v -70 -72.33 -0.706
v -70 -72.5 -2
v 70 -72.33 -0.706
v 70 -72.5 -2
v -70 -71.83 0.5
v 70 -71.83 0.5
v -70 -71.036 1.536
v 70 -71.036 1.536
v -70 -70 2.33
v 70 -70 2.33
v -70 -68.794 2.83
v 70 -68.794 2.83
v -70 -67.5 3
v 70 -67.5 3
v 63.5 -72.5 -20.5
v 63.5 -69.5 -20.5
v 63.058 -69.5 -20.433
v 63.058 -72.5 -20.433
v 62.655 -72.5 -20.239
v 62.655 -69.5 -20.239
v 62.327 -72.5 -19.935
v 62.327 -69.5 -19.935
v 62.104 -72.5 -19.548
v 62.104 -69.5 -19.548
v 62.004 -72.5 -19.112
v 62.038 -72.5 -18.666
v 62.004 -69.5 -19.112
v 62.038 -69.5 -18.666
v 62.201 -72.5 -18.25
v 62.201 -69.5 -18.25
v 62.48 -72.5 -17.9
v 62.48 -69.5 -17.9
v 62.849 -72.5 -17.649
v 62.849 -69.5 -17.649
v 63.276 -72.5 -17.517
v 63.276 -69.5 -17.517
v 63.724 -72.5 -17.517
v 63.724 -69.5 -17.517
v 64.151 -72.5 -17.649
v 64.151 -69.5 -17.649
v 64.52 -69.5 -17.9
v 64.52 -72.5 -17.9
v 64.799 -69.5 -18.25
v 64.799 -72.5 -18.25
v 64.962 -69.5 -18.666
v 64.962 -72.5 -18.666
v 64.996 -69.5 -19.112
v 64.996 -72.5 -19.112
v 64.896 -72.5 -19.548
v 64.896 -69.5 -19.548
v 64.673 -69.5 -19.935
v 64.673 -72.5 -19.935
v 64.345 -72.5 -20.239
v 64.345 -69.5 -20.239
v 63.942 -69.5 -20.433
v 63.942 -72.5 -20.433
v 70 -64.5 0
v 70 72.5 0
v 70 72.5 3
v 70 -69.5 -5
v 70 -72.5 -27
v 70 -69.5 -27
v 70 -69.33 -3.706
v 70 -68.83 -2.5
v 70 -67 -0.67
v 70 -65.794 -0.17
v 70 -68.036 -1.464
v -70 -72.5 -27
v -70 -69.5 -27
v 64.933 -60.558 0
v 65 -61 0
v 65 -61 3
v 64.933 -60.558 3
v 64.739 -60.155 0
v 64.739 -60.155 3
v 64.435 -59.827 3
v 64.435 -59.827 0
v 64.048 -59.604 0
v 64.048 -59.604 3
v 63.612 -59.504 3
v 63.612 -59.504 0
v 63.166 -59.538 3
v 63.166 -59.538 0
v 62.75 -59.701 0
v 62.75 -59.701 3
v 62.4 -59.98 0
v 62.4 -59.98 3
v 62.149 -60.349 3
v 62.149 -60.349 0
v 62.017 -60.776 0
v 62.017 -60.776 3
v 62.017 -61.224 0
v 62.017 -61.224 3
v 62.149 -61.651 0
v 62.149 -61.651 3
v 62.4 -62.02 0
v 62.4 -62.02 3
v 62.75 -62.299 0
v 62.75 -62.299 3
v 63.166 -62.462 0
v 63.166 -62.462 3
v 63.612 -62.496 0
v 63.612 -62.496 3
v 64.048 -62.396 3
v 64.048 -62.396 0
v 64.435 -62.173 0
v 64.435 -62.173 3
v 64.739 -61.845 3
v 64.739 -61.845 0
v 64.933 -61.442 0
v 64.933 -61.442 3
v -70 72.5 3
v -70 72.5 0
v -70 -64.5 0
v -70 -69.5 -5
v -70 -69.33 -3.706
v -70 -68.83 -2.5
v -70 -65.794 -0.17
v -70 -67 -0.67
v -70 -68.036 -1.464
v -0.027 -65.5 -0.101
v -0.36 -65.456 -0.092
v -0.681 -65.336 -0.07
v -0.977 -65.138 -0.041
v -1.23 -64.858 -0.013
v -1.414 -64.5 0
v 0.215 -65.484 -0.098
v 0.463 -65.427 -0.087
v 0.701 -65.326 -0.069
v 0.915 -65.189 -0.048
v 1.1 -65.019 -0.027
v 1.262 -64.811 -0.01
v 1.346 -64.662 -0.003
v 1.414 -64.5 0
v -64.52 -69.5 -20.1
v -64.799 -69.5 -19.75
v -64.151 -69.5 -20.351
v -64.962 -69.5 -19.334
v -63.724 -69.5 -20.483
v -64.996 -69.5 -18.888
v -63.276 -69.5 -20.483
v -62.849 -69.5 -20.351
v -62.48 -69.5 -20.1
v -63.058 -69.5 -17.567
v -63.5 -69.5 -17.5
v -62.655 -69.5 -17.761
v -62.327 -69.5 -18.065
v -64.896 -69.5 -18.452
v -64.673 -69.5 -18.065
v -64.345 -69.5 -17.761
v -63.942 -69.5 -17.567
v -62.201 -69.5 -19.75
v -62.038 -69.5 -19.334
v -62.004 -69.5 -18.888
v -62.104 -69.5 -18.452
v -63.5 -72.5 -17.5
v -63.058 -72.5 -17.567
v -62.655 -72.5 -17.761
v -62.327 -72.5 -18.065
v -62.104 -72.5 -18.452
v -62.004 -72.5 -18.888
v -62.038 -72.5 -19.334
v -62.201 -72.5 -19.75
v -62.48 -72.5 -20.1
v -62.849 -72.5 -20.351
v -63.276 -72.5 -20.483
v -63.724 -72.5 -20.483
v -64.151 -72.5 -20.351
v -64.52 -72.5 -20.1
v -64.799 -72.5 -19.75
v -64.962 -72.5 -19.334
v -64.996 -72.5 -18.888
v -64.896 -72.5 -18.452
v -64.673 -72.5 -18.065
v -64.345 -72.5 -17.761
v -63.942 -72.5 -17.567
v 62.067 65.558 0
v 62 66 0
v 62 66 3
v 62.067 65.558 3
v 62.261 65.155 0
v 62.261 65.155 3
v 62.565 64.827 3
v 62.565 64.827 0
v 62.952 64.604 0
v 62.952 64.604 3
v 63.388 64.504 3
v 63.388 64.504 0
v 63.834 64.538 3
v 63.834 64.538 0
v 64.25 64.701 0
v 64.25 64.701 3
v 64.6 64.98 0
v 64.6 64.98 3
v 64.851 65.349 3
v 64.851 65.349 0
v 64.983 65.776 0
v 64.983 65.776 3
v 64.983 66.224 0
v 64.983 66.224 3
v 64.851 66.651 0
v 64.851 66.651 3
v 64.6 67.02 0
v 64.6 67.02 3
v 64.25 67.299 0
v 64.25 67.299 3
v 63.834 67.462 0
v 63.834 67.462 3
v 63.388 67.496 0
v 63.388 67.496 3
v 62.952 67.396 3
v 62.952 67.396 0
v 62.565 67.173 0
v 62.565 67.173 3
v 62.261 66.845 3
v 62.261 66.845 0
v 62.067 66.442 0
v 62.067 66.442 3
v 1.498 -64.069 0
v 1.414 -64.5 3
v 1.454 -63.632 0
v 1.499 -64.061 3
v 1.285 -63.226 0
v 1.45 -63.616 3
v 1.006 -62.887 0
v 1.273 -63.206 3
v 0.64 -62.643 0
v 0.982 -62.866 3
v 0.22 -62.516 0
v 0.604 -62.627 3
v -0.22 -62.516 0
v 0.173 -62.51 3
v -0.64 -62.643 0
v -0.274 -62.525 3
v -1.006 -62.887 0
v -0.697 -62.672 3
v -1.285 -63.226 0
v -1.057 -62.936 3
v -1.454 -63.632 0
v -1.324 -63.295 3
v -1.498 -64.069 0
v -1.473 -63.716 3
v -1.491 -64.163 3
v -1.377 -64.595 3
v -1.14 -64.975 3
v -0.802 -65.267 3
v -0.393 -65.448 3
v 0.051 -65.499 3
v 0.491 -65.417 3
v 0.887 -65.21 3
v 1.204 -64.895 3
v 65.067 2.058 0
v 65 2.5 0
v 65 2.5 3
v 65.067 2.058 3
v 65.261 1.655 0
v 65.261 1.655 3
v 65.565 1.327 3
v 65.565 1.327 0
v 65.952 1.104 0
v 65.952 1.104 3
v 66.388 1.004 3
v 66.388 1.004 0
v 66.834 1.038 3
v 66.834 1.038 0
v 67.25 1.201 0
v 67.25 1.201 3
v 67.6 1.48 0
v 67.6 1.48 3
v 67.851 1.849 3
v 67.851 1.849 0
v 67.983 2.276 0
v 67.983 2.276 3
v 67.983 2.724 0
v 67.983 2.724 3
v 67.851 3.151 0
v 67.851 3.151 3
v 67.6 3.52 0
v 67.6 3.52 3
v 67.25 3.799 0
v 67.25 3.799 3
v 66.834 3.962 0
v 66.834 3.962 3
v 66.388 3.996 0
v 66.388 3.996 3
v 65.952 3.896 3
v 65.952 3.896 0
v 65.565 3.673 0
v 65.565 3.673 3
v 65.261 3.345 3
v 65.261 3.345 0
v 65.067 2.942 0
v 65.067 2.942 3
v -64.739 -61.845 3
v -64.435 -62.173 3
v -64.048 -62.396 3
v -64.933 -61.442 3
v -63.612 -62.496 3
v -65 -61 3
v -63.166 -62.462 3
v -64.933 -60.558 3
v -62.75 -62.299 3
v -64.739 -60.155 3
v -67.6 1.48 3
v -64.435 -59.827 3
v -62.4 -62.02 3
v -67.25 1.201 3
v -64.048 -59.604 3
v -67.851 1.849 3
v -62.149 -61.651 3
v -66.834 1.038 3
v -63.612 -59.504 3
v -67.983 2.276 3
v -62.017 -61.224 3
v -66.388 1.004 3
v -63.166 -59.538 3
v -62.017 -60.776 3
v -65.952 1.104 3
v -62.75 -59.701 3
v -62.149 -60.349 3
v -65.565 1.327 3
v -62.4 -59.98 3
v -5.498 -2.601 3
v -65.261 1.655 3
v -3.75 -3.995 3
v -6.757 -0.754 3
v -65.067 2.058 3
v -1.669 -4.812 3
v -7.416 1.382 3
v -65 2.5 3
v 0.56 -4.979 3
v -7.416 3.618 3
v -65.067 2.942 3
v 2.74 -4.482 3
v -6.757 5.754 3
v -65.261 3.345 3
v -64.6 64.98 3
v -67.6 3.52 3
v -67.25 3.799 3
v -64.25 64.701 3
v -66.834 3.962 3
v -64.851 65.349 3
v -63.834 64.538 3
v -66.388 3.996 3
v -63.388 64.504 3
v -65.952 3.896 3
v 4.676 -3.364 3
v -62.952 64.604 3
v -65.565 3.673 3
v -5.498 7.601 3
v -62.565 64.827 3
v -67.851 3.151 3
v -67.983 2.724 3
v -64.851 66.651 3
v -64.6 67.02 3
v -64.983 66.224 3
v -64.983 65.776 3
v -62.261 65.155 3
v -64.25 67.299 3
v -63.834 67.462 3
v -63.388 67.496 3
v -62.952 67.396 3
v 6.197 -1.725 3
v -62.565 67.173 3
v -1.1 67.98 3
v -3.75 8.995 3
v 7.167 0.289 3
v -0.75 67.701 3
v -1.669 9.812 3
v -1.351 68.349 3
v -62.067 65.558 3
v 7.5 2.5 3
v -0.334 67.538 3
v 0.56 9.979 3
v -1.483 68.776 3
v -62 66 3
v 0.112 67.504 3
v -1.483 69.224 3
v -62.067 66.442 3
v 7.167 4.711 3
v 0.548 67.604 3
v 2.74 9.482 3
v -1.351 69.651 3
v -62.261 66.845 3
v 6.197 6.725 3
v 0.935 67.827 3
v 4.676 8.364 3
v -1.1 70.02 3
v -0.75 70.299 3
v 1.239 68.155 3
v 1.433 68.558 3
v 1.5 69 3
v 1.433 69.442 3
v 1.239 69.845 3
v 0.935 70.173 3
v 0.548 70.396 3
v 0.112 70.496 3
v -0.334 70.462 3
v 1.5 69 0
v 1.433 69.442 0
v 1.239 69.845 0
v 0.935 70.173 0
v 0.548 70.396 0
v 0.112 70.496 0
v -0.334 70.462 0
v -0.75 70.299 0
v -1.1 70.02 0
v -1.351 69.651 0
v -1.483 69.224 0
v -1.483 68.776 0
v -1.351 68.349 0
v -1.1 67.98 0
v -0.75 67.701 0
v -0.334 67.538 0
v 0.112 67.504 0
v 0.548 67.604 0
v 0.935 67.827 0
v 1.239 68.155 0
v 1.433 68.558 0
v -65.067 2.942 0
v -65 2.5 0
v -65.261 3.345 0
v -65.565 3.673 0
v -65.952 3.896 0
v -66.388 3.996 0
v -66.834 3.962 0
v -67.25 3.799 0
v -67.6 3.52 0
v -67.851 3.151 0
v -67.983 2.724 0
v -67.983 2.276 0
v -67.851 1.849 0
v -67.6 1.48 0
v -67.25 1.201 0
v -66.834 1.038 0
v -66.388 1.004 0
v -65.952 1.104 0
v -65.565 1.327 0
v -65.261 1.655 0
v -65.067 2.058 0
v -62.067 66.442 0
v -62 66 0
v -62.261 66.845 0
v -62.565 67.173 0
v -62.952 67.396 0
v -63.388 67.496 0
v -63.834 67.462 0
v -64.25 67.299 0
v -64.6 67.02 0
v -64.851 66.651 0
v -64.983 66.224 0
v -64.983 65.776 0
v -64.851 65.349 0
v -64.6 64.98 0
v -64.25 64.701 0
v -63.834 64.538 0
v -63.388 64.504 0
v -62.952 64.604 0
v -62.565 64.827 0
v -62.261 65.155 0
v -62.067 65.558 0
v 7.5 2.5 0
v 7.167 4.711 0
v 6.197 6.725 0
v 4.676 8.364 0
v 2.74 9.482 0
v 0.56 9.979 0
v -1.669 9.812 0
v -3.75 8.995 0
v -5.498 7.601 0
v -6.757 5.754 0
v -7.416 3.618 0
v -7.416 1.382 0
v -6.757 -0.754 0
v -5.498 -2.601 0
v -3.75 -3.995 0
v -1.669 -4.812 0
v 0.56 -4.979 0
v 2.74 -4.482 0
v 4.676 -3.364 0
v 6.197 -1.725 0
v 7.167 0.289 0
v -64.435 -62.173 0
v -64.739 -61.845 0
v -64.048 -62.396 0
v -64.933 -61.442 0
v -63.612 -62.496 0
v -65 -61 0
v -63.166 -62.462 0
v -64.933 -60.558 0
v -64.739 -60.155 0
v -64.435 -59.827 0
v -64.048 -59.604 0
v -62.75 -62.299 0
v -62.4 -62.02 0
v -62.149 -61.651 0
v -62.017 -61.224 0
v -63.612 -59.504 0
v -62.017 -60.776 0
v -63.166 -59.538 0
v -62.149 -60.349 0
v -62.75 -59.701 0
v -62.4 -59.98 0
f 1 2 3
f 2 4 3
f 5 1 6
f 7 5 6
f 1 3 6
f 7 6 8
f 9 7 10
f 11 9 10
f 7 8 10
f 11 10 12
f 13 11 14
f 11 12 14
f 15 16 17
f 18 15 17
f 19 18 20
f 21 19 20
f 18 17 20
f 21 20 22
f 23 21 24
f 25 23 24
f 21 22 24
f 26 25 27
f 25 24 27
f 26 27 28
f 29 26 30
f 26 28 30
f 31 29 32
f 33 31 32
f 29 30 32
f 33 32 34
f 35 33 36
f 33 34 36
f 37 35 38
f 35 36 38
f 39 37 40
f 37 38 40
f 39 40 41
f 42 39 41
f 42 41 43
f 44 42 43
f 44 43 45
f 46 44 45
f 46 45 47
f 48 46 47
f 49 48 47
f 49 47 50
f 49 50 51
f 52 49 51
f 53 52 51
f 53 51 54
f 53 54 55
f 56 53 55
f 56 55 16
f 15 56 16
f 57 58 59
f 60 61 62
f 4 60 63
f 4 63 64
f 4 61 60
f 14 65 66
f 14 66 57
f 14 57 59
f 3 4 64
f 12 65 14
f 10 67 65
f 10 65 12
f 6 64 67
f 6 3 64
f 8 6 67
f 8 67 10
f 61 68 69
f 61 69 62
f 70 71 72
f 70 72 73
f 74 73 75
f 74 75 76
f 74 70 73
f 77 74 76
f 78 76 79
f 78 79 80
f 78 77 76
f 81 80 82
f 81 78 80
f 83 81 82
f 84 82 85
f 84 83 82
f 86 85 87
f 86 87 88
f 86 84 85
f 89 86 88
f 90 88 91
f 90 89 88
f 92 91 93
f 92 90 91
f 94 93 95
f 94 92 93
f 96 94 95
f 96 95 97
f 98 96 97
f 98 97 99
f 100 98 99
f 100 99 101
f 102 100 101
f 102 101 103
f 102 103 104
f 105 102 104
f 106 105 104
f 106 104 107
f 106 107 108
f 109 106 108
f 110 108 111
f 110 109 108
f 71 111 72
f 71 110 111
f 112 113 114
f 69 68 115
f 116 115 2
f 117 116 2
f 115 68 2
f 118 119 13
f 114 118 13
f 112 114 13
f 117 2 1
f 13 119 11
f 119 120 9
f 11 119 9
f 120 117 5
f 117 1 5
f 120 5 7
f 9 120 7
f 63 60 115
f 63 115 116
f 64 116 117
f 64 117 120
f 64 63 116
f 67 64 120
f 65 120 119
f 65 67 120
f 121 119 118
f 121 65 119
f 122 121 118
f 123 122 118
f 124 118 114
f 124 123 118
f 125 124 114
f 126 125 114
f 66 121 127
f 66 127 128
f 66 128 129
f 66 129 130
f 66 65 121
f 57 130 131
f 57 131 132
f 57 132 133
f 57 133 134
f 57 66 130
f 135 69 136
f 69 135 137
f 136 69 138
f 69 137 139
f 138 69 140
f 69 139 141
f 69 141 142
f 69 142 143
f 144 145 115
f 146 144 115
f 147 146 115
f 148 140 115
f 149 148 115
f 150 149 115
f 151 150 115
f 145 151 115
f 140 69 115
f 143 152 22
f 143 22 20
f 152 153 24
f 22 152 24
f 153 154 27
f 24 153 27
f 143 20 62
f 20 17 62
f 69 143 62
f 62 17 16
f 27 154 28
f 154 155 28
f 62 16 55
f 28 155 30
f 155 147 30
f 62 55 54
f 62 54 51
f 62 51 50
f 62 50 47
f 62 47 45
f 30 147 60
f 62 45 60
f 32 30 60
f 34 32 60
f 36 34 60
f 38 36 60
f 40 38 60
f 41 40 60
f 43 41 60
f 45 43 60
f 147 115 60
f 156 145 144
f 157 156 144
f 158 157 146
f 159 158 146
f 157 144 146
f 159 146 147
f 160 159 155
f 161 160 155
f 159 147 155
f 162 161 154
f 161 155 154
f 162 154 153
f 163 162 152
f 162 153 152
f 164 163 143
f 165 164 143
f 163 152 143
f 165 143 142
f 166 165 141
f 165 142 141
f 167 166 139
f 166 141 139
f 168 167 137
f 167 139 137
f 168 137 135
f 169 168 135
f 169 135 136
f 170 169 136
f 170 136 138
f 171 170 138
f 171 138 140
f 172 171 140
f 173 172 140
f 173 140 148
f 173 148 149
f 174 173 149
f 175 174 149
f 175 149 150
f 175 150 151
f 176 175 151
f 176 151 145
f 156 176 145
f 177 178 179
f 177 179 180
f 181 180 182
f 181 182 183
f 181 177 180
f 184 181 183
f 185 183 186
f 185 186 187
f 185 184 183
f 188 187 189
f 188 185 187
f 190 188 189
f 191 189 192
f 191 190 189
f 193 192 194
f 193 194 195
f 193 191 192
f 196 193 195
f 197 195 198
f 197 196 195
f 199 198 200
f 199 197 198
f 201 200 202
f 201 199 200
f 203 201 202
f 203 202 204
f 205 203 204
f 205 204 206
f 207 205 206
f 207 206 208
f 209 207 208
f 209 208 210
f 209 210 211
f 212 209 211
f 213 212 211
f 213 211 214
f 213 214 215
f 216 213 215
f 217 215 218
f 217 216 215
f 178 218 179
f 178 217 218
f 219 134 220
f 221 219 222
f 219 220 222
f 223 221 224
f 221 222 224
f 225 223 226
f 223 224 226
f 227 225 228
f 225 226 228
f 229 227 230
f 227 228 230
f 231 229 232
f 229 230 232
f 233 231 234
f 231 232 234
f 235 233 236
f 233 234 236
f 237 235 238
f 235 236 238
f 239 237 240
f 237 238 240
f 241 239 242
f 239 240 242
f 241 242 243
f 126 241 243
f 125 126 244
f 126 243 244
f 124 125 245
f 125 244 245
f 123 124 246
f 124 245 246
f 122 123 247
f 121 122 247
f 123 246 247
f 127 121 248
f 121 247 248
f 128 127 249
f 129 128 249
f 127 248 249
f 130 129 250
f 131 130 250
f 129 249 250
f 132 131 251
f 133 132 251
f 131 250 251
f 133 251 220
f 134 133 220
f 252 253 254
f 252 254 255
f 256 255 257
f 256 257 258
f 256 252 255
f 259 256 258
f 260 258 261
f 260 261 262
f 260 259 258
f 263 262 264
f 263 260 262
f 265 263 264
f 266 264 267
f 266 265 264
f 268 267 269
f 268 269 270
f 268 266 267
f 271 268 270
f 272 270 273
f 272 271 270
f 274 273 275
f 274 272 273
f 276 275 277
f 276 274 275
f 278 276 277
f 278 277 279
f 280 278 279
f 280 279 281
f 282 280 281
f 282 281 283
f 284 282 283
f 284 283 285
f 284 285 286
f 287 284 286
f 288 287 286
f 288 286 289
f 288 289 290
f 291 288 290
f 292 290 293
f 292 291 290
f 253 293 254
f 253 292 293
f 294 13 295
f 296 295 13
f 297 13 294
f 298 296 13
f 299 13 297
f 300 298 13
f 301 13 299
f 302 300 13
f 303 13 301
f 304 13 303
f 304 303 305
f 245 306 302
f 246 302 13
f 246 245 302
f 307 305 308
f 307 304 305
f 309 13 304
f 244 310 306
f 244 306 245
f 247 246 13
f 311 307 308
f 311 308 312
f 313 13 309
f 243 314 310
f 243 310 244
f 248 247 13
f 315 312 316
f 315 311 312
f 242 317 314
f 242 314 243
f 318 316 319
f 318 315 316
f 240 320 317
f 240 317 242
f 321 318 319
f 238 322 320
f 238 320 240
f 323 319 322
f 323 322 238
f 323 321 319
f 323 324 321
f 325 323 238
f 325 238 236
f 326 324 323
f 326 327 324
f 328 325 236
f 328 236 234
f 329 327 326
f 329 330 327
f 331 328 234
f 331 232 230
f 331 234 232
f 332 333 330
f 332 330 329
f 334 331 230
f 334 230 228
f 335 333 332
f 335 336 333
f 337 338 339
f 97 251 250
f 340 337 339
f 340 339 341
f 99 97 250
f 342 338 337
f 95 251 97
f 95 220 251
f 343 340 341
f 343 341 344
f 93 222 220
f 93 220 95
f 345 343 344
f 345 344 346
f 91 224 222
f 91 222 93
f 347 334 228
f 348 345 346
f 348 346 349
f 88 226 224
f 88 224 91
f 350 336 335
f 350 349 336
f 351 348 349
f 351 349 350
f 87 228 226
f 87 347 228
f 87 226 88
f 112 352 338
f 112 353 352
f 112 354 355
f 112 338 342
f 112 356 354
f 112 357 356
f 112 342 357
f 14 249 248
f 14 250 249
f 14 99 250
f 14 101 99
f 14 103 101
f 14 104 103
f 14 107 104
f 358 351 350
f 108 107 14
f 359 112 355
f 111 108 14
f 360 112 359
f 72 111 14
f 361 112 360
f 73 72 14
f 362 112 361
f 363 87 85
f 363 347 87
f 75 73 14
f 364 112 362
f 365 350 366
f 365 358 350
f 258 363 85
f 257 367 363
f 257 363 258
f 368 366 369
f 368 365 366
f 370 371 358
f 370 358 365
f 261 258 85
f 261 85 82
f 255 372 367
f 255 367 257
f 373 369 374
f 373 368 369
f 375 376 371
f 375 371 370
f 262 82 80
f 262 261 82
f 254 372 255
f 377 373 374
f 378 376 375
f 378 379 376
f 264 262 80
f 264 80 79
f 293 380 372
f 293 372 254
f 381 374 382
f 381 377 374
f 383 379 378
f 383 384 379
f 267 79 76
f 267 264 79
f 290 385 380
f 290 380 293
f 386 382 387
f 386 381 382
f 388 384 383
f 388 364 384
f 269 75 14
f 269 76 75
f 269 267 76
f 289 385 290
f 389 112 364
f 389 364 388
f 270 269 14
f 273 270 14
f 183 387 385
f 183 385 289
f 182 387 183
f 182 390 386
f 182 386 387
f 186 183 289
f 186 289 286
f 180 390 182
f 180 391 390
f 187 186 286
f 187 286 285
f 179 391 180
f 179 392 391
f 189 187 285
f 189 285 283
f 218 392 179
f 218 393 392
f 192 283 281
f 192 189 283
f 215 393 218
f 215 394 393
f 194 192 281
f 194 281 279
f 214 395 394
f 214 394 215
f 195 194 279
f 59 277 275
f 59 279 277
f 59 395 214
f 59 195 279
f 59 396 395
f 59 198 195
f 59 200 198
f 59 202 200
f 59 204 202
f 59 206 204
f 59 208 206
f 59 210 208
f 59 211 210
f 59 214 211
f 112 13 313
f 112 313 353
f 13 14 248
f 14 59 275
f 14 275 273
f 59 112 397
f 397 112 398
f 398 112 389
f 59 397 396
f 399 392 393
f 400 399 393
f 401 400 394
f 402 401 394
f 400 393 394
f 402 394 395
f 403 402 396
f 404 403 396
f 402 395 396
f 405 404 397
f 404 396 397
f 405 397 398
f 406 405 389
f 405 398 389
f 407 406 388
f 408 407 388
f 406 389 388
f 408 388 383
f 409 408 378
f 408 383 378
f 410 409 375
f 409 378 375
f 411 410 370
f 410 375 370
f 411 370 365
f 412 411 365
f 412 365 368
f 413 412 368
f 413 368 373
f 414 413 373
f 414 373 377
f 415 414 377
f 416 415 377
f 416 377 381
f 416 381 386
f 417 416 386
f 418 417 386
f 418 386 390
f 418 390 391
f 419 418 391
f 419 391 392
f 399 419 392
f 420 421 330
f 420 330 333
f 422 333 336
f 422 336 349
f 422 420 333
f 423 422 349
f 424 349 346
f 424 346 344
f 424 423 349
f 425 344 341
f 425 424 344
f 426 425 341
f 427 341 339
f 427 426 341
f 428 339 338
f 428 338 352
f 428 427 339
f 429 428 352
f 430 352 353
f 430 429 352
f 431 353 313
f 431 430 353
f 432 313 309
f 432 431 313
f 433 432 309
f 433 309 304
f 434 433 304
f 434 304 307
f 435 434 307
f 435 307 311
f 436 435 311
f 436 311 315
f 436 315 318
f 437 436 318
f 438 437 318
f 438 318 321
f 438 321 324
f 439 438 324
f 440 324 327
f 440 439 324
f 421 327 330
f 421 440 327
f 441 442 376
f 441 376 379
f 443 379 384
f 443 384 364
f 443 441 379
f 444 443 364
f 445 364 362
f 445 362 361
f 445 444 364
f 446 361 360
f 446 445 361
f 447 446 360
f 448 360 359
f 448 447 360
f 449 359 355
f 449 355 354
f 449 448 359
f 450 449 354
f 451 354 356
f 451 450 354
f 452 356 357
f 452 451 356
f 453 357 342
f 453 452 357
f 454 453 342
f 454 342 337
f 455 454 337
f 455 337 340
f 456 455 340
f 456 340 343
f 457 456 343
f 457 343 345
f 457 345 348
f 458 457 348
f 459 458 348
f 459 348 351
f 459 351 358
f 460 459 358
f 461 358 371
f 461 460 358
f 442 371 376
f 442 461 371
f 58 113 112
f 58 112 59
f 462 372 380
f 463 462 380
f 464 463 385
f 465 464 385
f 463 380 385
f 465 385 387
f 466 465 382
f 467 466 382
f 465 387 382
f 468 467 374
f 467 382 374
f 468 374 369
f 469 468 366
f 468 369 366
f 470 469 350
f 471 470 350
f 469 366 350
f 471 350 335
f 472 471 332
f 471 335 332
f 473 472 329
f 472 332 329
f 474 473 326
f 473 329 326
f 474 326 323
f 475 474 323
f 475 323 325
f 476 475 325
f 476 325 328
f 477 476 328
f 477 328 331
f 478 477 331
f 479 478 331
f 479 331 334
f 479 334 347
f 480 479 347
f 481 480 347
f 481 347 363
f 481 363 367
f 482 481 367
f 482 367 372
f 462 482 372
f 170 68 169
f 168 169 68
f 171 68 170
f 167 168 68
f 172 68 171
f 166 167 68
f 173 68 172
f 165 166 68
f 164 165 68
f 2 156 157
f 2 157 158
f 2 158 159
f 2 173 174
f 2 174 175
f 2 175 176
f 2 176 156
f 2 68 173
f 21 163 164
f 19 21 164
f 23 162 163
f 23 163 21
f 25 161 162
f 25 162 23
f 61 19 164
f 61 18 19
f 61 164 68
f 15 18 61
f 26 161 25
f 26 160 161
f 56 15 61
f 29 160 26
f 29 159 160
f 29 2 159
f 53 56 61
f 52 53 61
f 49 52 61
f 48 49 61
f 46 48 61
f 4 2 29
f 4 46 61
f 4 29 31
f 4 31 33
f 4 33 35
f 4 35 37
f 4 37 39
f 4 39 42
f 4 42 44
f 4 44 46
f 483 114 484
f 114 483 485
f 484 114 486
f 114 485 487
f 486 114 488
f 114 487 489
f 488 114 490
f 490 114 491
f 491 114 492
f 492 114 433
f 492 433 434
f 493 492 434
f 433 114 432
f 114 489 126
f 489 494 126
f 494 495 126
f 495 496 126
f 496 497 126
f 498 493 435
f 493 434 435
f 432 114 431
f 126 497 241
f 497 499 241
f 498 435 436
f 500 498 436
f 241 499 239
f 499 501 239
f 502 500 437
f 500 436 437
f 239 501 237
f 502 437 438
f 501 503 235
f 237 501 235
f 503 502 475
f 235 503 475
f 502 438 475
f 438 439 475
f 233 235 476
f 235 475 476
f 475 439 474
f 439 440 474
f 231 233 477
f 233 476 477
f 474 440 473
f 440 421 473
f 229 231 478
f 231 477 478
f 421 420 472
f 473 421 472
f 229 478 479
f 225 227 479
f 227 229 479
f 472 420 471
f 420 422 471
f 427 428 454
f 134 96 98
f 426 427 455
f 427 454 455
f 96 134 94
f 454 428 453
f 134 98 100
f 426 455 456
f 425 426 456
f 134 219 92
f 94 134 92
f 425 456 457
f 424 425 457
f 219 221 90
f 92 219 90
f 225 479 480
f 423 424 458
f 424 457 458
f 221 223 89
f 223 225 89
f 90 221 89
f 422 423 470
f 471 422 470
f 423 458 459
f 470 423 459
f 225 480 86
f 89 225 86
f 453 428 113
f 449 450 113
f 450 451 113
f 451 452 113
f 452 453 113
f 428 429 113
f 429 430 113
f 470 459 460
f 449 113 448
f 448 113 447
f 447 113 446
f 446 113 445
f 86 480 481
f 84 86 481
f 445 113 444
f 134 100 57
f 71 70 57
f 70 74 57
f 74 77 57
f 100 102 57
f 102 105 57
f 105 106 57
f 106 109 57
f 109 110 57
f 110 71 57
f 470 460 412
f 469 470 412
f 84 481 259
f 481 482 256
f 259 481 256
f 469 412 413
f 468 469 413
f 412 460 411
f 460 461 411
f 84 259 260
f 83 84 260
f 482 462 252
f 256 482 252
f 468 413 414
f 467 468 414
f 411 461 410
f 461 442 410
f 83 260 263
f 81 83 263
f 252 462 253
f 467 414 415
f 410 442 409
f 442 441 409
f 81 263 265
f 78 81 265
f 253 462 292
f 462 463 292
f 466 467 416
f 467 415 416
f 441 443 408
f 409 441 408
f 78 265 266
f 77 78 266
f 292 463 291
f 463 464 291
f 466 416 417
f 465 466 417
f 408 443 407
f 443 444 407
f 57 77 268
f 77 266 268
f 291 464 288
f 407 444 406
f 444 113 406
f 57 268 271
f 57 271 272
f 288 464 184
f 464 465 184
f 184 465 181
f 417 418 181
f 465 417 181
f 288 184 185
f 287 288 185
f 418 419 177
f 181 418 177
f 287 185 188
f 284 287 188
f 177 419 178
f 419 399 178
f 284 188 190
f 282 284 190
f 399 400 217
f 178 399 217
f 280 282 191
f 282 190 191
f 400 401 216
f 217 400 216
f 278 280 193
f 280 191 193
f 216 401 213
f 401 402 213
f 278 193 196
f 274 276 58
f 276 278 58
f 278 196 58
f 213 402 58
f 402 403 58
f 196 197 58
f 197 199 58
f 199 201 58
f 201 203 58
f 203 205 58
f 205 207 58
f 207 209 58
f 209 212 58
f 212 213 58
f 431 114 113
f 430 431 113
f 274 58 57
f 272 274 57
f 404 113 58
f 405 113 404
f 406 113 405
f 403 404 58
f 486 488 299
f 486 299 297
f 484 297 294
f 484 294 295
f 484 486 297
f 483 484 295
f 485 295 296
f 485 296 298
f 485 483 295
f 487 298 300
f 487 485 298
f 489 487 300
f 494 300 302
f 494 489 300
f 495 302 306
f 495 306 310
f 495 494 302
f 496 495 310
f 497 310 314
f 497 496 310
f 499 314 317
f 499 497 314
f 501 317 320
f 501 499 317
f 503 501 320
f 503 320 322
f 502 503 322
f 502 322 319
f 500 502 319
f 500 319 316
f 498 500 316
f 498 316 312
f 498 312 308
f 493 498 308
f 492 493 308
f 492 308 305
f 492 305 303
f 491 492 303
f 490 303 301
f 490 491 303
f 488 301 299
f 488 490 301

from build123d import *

# Parameters (mm, degrees)
SKICA1_W                 = 140
SKICA1_H                 = 145
SKICA1_R                 = 1.5
P_IDAT_VYSUNUT_M1_DEPTH  = 3
SKICA2_W                 = 140
SKICA2_H                 = 30
P_IDAT_VYSUNUT_M2_DEPTH  = 3
SKICA3_R                 = 1.5
ODEBRAT_VYSUNUT_M1_DEPTH = 161.601992516
ZAOBLIT1_R               = 5
SKICA4_R                 = 7.5
SKICA4_R_2               = 1.5
ODEBRAT_VYSUNUT_M2_DEPTH = 106.148704224


with BuildPart() as part:
    # Skica1 → Přidat vysunutím1 (new body)
    with BuildSketch(Plane.XY):
        Rectangle(SKICA1_W, SKICA1_H)
        with Locations((-63.5, 66)):
            Circle(SKICA1_R, mode=Mode.SUBTRACT)
        with Locations((-66.5, 2.5)):
            Circle(SKICA1_R, mode=Mode.SUBTRACT)
        with Locations(Location((63.5, 66, 0), (0, 0, 180))):
            Circle(SKICA1_R, mode=Mode.SUBTRACT)
        with Locations(Location((66.5, 2.5, 0), (0, 0, 180))):
            Circle(SKICA1_R, mode=Mode.SUBTRACT)
        with Locations((63.5, -61)):
            Circle(SKICA1_R, mode=Mode.SUBTRACT)
        with Locations(Location((-63.5, -61, 0), (0, 0, 180))):
            Circle(SKICA1_R, mode=Mode.SUBTRACT)
    extrude(amount=P_IDAT_VYSUNUT_M1_DEPTH)

    # Skica2 → Přidat vysunutím2 (add)
    with BuildSketch(Plane.XZ.offset(72.5)):
        with Locations((0, -12)):
            Rectangle(SKICA2_W, SKICA2_H)
    extrude(amount=-P_IDAT_VYSUNUT_M2_DEPTH)

    # Skica3 → Odebrat vysunutím1 (cut, through all)
    with BuildSketch(Plane(origin=(0, -69.5, 0), x_dir=(1, 0, 0), z_dir=(0, 1, 0))):
        with Locations(Location((-63.5, 19, 0), (0, 0, 270))):
            Circle(SKICA3_R)
        with Locations(Location((63.5, 19, 0), (0, 0, 90))):
            Circle(SKICA3_R)
    extrude(amount=-ODEBRAT_VYSUNUT_M1_DEPTH, mode=Mode.SUBTRACT)

    # Zaoblit1
    zaoblit1_edges = [part.edges().sort_by_distance(p)[0] for p in [
        (0, -72.5, 3),
        (0, -69.5, 0),
    ]]
    fillet(zaoblit1_edges, radius=ZAOBLIT1_R)

    # Skica4 → Odebrat vysunutím2 (cut, through all)
    with BuildSketch(Plane.XY.offset(3)):
        with Locations((0, 2.5)):
            Circle(SKICA4_R)
        with Locations((0, 69)):
            Circle(SKICA4_R_2)
        with Locations(Location((0, -64, 0), (0, 0, 340.528779366))):
            Circle(SKICA4_R_2)
    extrude(amount=-ODEBRAT_VYSUNUT_M2_DEPTH, mode=Mode.SUBTRACT)


solid = part.part
